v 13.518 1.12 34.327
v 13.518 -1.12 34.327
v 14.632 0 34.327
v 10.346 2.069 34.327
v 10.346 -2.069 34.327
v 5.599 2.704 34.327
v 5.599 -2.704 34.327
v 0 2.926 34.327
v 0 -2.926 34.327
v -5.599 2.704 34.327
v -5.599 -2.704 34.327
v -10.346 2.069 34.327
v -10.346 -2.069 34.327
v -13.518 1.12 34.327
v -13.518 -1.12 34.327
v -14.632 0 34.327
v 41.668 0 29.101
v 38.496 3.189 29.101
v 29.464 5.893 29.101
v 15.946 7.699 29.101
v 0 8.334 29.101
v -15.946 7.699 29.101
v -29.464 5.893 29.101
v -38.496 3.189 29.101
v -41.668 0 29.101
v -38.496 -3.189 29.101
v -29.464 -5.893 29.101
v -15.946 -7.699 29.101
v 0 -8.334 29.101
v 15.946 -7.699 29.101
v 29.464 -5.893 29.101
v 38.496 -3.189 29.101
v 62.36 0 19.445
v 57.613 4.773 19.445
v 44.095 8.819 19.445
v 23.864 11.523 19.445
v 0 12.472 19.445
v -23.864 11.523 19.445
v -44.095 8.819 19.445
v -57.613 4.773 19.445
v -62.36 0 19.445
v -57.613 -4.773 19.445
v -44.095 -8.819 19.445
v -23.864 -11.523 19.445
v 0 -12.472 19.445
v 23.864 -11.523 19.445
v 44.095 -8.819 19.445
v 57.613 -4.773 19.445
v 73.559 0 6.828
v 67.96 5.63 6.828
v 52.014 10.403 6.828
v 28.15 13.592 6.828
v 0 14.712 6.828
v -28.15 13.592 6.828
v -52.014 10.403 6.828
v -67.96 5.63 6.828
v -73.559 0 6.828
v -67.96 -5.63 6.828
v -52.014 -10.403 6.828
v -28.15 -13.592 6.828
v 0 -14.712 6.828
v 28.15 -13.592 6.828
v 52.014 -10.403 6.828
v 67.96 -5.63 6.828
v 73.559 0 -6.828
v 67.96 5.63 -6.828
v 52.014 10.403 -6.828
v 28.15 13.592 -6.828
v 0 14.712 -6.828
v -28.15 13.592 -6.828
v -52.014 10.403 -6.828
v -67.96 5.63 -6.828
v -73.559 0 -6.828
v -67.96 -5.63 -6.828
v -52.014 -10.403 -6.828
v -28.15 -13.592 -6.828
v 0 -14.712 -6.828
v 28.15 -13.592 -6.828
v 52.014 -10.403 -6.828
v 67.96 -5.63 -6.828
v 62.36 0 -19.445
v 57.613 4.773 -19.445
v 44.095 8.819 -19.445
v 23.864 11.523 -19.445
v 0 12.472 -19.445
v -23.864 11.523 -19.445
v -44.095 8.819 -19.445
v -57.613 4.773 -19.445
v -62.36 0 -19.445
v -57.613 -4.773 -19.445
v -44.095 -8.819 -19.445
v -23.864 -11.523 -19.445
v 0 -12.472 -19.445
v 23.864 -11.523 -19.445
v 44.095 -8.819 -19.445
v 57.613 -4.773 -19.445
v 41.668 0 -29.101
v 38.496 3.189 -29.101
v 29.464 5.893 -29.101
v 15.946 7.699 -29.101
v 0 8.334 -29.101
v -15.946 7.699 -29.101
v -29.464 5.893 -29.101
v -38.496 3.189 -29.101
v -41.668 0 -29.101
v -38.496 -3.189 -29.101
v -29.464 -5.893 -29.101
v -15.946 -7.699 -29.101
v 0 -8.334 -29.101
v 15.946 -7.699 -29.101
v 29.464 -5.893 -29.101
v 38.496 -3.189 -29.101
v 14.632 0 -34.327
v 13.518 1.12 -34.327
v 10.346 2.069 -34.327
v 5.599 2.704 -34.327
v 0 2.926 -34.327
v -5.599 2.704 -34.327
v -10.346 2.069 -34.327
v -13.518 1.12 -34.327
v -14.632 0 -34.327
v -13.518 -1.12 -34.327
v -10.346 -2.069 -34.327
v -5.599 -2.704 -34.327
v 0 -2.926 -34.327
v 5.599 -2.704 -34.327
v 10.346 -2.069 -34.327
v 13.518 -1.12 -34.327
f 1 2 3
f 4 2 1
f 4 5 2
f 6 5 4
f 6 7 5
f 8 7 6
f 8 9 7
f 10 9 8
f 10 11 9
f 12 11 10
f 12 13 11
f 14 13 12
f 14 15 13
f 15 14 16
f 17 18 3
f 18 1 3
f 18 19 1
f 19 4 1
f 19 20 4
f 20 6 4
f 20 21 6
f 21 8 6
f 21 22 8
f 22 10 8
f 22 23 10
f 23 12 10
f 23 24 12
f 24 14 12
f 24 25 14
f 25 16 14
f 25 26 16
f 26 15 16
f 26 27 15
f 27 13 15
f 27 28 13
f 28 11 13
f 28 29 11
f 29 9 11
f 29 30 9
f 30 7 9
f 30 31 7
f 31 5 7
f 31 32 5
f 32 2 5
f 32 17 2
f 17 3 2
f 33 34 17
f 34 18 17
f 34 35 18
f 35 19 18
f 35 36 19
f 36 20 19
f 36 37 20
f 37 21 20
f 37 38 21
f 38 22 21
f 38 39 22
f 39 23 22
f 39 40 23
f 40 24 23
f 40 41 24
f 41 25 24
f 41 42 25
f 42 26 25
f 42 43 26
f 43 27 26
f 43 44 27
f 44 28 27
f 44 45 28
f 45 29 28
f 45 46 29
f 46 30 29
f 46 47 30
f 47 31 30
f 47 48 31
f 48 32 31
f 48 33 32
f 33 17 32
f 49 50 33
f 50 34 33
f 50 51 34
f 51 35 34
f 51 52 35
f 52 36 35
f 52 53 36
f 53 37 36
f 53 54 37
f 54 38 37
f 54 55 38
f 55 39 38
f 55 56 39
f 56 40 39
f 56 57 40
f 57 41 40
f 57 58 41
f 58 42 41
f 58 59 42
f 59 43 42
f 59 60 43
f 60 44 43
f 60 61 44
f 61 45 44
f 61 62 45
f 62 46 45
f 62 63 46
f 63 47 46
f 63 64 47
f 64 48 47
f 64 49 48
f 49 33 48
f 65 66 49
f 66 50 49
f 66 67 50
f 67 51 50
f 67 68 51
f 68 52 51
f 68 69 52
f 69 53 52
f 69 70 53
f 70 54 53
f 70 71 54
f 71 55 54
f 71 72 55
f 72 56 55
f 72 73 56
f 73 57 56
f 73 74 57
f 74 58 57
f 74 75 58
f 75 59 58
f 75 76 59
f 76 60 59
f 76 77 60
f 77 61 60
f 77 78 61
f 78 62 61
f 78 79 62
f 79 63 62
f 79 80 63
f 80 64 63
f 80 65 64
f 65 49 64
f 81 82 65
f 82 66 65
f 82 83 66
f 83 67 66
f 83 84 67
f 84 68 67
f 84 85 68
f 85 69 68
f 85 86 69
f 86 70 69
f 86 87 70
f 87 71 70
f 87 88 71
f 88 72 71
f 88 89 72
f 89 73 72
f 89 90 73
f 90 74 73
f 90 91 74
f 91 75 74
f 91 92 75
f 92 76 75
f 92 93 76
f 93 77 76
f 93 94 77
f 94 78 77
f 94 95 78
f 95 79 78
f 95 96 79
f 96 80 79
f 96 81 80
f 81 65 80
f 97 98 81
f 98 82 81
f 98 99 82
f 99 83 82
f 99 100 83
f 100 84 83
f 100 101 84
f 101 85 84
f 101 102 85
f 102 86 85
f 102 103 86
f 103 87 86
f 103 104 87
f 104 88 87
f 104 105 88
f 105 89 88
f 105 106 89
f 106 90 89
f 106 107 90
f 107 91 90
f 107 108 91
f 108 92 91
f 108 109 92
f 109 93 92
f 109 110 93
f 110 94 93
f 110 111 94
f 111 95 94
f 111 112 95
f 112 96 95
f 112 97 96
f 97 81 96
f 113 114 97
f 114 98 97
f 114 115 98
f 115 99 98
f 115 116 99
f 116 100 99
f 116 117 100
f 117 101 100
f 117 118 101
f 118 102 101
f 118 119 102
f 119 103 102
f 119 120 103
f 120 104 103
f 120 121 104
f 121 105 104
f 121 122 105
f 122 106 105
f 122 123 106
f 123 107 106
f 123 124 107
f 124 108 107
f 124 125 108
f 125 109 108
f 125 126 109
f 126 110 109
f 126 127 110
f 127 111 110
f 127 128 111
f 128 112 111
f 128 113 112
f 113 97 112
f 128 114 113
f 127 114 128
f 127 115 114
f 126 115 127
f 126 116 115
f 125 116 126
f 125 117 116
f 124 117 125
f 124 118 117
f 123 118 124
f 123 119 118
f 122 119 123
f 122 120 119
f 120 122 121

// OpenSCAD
// Generated by SolidPython 1.0.1 on 2020-07-29 00:46:51


scale(v = [15, 3, 7]) {
	sphere(r = 5);
}
/***********************************************
*********      SolidPython code:      **********
************************************************
 
# import packages: SolidPython
from solid import *
from solid.utils import *
from itertools import chain, combinations, permutations


class Resize:

    def __init__(self, scad_file):
        self.scad_file = scad_file
        #self.scad_file = import_scad(scad_file)
        # cone/cylinder param:
        self.r1 = 0
        self.r2 = 0
        self.h = 0
        # rectangular prism param:
        self.w = 0
        self.l = 0
        # ellipse param:
        self.r = 0

    # import OpenScad code (file name corresponds to shape)


    # classify shape + parameters
    def assign(self, param1, param2, param3):
        if self.scad_file == 'cone.scad':
            self.r1 = param1
            self.r2 = param2
            self.h = param3
        elif self.scad_file == 'cylinder.scad':
            self.r1 = param1
            self.r2 = param2
            self.h = param3
        elif self.scad_file == 'rectangularPrism.scad':
            self.h = param1
            self.l = param2
            self.w = param3
        else:
            self.r = param1
            self.h = param2

    # resize parameters
    def iterate(self):
        x = range(3, 20, 2)
        i = 1
        if self.scad_file == 'cone.scad':
            tempList = list(permutations(x, 2))
            for temp in tempList:
                param1 = temp[0]
                param2 = temp[1]
                filepath = 'produced_scad_files/' + 'cone' + str(param1) + '_' + str(param2) + '_' + '.scad'
                scad_render_to_file(cylinder(h=param1, r1=param2, r2=0), filepath)

        elif self.scad_file == 'cylinder.scad':
            tempList = list(permutations(x, 3))
            for temp in tempList:
                param1 = temp[0]
                param2 = temp[1]
                filepath = 'produced_scad_files/' + 'cylinder' + str(param1) + '_' + str(param2) + '_' + '.scad'
                scad_render_to_file(cylinder(h=param1, r1=param2, r2=param2), filepath)

        elif self.scad_file == 'rectangularPrism.scad':
            tempList = list(permutations(x, 3))
            for temp in tempList:
                param1 = temp[0]
                param2 = temp[1]
                param3 = temp[2]
                filepath = 'produced_scad_files/' + 'rectangularPrism' + str(param1) + '_' + str(param2) + '_' + str(
                    param3) + '.scad'
                scad_render_to_file(cube(size=(param1, param2, param3)), filepath)

        elif self.scad_file == 'ellipse.scad':
            tempList = list(permutations(x, 4))
            for temp in tempList:
                param1 = temp[0]
                param2 = temp[1]
                param3 = temp[2]
                param4 = temp[3]
                filepath = 'produced_scad_files/' + 'ellipse' + str(param1) + '_' + str(param2) + '_' + str(param3) + '_' + str(param4) + '.scad'
                scad_render_to_file(scale([param1, param2, param3])(sphere(r=param4)), filepath)

    def render_to_scadfile(self):
        scad_render_to_file(scad, 'example.scad') 
 
************************************************/
